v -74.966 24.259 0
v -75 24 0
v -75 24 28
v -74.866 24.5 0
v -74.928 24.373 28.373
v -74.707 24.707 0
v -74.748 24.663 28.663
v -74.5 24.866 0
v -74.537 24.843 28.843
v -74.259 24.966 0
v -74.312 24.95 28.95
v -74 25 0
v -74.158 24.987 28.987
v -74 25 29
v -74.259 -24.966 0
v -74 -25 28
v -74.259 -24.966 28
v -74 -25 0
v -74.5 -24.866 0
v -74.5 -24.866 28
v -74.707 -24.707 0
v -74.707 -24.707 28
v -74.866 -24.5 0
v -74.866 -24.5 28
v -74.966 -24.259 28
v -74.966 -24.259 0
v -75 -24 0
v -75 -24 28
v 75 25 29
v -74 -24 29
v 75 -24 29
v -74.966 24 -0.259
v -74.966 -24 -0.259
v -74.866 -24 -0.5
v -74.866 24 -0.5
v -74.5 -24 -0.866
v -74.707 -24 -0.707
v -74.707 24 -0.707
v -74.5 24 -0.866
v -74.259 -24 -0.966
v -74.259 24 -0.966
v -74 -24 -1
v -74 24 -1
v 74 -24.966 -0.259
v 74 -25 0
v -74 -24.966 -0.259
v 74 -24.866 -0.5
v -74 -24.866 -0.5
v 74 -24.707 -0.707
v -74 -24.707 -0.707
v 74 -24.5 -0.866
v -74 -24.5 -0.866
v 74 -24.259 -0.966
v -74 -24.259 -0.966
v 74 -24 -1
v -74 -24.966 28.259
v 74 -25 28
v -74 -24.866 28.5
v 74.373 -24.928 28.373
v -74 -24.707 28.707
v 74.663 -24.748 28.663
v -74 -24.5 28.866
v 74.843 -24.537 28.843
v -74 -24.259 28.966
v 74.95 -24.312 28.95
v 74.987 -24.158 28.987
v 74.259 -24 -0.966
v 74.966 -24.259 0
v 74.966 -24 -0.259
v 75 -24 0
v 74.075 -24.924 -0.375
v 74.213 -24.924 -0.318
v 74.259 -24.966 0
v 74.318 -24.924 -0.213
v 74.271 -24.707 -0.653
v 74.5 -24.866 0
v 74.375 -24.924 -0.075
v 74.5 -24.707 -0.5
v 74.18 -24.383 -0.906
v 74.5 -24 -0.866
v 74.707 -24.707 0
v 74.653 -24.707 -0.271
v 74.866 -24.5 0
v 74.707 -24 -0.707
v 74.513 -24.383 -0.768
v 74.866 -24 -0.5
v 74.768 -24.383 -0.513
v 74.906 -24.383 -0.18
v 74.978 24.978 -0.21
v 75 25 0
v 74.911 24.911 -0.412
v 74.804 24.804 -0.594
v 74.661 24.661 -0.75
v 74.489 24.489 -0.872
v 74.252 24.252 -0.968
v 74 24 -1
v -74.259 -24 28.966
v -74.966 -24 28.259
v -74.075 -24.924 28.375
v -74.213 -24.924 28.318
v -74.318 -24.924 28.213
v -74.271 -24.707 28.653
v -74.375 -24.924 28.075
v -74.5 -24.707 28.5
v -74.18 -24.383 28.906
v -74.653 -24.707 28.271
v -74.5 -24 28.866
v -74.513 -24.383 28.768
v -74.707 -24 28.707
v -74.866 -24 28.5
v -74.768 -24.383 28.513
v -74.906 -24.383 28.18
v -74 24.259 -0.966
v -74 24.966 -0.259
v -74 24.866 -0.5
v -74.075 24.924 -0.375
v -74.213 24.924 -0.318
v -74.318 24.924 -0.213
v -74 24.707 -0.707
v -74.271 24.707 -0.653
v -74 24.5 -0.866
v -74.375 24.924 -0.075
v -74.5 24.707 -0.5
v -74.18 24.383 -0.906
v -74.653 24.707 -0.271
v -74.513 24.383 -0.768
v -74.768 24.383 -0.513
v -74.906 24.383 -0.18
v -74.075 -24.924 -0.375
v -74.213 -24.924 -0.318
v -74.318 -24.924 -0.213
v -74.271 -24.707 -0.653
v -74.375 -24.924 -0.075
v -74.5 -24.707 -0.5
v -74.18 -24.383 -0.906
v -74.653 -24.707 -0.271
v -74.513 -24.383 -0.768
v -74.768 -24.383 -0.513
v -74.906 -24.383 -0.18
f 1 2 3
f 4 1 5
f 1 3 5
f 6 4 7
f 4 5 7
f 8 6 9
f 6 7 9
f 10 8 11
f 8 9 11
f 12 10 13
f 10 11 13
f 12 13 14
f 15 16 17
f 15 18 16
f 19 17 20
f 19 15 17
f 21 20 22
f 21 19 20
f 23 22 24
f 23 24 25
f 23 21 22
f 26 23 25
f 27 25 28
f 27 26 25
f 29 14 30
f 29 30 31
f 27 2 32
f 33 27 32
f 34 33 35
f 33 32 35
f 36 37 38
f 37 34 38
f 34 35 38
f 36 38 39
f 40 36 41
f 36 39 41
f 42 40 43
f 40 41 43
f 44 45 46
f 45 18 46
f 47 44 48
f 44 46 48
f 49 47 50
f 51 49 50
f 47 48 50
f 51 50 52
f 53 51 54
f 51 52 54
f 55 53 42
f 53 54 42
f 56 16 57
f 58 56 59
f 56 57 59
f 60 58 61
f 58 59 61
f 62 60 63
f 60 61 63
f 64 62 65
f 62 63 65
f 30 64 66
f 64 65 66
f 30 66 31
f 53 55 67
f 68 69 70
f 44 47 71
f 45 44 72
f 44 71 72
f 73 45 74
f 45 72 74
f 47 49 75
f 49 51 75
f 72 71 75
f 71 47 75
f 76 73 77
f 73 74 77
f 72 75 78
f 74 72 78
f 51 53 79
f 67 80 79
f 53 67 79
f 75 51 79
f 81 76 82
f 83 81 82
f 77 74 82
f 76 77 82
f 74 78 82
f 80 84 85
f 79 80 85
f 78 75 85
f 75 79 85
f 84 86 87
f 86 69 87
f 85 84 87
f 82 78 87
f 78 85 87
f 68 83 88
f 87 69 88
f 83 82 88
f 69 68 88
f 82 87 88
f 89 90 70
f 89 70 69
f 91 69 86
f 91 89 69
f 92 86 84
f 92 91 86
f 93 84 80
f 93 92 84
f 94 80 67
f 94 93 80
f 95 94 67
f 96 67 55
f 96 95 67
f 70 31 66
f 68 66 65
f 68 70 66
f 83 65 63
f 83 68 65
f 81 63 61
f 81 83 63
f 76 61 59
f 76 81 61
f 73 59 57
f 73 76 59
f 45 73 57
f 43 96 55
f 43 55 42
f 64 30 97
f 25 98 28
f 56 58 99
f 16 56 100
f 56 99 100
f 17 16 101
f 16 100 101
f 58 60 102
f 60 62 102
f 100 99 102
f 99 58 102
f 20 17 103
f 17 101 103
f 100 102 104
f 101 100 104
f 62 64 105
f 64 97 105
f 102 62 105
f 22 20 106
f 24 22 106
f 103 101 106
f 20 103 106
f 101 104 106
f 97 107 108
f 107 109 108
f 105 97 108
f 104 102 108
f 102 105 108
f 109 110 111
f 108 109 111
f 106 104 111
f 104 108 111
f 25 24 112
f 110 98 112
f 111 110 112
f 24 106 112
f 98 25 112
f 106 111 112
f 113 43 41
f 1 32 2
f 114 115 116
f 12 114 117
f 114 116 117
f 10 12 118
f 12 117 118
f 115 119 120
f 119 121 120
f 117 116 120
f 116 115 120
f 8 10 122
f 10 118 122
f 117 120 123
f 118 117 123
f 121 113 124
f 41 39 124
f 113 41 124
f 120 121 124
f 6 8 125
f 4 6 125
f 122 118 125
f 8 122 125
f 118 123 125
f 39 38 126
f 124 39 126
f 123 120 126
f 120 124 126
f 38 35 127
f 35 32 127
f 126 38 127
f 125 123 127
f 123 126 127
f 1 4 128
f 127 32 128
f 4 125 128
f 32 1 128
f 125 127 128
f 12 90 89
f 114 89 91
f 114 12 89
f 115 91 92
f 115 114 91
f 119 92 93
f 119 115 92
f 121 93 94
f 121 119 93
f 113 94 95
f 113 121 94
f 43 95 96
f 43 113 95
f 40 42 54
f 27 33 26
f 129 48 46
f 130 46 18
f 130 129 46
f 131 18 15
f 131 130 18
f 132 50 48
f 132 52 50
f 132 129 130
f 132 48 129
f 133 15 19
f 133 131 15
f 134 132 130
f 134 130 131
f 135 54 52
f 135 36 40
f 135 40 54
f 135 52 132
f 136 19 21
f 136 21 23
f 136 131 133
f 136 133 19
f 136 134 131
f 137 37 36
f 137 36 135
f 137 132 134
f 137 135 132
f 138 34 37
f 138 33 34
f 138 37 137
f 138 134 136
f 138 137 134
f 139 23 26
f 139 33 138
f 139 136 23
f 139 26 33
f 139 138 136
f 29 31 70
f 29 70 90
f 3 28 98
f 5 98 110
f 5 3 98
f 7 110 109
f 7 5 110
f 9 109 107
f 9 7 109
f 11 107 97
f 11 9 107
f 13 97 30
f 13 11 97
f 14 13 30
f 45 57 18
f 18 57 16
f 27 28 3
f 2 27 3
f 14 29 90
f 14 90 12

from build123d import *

# Parameters (mm, degrees)
SKETCH1_W           = 150
SKETCH1_H           = 50
BOSS_EXTRUDE1_DEPTH = 28
SKETCH3_W           = 150
SKETCH3_H           = 50
BOSS_EXTRUDE2_DEPTH = 1
SKETCH4_W           = 150
SKETCH4_H           = 50
BOSS_EXTRUDE3_DEPTH = 1
FILLET1_R           = 1


with BuildPart() as part:
    # Sketch1 → Boss-Extrude1 (new body)
    with BuildSketch(Plane.XY):
        Rectangle(SKETCH1_W, SKETCH1_H)
    extrude(amount=BOSS_EXTRUDE1_DEPTH)

    # Sketch3 → Boss-Extrude2 (add)
    with BuildSketch(Plane.XY.offset(28)):
        Rectangle(SKETCH3_W, SKETCH3_H)
    extrude(amount=BOSS_EXTRUDE2_DEPTH)

    # Sketch4 → Boss-Extrude3 (add)
    with BuildSketch(Plane(origin=(0, 0, 0), x_dir=(-1, 0, 0), z_dir=(0, 0, -1))):
        Rectangle(SKETCH4_W, SKETCH4_H)
    extrude(amount=BOSS_EXTRUDE3_DEPTH)

    # Fillet1
    fillet1_edges = [part.edges().sort_by_distance(p)[0] for p in [
        (-75, 0, 29),
        (0, -25, 29),
        (-75, 0, -1),
        (0, 25, -1),
        (75, 0, -1),
        (0, -25, -1),
        (75, -25, 14),
        (-75, -25, 14),
        (-75, 25, 14),
    ]]
    fillet(fillet1_edges, radius=FILLET1_R)


solid = part.part
